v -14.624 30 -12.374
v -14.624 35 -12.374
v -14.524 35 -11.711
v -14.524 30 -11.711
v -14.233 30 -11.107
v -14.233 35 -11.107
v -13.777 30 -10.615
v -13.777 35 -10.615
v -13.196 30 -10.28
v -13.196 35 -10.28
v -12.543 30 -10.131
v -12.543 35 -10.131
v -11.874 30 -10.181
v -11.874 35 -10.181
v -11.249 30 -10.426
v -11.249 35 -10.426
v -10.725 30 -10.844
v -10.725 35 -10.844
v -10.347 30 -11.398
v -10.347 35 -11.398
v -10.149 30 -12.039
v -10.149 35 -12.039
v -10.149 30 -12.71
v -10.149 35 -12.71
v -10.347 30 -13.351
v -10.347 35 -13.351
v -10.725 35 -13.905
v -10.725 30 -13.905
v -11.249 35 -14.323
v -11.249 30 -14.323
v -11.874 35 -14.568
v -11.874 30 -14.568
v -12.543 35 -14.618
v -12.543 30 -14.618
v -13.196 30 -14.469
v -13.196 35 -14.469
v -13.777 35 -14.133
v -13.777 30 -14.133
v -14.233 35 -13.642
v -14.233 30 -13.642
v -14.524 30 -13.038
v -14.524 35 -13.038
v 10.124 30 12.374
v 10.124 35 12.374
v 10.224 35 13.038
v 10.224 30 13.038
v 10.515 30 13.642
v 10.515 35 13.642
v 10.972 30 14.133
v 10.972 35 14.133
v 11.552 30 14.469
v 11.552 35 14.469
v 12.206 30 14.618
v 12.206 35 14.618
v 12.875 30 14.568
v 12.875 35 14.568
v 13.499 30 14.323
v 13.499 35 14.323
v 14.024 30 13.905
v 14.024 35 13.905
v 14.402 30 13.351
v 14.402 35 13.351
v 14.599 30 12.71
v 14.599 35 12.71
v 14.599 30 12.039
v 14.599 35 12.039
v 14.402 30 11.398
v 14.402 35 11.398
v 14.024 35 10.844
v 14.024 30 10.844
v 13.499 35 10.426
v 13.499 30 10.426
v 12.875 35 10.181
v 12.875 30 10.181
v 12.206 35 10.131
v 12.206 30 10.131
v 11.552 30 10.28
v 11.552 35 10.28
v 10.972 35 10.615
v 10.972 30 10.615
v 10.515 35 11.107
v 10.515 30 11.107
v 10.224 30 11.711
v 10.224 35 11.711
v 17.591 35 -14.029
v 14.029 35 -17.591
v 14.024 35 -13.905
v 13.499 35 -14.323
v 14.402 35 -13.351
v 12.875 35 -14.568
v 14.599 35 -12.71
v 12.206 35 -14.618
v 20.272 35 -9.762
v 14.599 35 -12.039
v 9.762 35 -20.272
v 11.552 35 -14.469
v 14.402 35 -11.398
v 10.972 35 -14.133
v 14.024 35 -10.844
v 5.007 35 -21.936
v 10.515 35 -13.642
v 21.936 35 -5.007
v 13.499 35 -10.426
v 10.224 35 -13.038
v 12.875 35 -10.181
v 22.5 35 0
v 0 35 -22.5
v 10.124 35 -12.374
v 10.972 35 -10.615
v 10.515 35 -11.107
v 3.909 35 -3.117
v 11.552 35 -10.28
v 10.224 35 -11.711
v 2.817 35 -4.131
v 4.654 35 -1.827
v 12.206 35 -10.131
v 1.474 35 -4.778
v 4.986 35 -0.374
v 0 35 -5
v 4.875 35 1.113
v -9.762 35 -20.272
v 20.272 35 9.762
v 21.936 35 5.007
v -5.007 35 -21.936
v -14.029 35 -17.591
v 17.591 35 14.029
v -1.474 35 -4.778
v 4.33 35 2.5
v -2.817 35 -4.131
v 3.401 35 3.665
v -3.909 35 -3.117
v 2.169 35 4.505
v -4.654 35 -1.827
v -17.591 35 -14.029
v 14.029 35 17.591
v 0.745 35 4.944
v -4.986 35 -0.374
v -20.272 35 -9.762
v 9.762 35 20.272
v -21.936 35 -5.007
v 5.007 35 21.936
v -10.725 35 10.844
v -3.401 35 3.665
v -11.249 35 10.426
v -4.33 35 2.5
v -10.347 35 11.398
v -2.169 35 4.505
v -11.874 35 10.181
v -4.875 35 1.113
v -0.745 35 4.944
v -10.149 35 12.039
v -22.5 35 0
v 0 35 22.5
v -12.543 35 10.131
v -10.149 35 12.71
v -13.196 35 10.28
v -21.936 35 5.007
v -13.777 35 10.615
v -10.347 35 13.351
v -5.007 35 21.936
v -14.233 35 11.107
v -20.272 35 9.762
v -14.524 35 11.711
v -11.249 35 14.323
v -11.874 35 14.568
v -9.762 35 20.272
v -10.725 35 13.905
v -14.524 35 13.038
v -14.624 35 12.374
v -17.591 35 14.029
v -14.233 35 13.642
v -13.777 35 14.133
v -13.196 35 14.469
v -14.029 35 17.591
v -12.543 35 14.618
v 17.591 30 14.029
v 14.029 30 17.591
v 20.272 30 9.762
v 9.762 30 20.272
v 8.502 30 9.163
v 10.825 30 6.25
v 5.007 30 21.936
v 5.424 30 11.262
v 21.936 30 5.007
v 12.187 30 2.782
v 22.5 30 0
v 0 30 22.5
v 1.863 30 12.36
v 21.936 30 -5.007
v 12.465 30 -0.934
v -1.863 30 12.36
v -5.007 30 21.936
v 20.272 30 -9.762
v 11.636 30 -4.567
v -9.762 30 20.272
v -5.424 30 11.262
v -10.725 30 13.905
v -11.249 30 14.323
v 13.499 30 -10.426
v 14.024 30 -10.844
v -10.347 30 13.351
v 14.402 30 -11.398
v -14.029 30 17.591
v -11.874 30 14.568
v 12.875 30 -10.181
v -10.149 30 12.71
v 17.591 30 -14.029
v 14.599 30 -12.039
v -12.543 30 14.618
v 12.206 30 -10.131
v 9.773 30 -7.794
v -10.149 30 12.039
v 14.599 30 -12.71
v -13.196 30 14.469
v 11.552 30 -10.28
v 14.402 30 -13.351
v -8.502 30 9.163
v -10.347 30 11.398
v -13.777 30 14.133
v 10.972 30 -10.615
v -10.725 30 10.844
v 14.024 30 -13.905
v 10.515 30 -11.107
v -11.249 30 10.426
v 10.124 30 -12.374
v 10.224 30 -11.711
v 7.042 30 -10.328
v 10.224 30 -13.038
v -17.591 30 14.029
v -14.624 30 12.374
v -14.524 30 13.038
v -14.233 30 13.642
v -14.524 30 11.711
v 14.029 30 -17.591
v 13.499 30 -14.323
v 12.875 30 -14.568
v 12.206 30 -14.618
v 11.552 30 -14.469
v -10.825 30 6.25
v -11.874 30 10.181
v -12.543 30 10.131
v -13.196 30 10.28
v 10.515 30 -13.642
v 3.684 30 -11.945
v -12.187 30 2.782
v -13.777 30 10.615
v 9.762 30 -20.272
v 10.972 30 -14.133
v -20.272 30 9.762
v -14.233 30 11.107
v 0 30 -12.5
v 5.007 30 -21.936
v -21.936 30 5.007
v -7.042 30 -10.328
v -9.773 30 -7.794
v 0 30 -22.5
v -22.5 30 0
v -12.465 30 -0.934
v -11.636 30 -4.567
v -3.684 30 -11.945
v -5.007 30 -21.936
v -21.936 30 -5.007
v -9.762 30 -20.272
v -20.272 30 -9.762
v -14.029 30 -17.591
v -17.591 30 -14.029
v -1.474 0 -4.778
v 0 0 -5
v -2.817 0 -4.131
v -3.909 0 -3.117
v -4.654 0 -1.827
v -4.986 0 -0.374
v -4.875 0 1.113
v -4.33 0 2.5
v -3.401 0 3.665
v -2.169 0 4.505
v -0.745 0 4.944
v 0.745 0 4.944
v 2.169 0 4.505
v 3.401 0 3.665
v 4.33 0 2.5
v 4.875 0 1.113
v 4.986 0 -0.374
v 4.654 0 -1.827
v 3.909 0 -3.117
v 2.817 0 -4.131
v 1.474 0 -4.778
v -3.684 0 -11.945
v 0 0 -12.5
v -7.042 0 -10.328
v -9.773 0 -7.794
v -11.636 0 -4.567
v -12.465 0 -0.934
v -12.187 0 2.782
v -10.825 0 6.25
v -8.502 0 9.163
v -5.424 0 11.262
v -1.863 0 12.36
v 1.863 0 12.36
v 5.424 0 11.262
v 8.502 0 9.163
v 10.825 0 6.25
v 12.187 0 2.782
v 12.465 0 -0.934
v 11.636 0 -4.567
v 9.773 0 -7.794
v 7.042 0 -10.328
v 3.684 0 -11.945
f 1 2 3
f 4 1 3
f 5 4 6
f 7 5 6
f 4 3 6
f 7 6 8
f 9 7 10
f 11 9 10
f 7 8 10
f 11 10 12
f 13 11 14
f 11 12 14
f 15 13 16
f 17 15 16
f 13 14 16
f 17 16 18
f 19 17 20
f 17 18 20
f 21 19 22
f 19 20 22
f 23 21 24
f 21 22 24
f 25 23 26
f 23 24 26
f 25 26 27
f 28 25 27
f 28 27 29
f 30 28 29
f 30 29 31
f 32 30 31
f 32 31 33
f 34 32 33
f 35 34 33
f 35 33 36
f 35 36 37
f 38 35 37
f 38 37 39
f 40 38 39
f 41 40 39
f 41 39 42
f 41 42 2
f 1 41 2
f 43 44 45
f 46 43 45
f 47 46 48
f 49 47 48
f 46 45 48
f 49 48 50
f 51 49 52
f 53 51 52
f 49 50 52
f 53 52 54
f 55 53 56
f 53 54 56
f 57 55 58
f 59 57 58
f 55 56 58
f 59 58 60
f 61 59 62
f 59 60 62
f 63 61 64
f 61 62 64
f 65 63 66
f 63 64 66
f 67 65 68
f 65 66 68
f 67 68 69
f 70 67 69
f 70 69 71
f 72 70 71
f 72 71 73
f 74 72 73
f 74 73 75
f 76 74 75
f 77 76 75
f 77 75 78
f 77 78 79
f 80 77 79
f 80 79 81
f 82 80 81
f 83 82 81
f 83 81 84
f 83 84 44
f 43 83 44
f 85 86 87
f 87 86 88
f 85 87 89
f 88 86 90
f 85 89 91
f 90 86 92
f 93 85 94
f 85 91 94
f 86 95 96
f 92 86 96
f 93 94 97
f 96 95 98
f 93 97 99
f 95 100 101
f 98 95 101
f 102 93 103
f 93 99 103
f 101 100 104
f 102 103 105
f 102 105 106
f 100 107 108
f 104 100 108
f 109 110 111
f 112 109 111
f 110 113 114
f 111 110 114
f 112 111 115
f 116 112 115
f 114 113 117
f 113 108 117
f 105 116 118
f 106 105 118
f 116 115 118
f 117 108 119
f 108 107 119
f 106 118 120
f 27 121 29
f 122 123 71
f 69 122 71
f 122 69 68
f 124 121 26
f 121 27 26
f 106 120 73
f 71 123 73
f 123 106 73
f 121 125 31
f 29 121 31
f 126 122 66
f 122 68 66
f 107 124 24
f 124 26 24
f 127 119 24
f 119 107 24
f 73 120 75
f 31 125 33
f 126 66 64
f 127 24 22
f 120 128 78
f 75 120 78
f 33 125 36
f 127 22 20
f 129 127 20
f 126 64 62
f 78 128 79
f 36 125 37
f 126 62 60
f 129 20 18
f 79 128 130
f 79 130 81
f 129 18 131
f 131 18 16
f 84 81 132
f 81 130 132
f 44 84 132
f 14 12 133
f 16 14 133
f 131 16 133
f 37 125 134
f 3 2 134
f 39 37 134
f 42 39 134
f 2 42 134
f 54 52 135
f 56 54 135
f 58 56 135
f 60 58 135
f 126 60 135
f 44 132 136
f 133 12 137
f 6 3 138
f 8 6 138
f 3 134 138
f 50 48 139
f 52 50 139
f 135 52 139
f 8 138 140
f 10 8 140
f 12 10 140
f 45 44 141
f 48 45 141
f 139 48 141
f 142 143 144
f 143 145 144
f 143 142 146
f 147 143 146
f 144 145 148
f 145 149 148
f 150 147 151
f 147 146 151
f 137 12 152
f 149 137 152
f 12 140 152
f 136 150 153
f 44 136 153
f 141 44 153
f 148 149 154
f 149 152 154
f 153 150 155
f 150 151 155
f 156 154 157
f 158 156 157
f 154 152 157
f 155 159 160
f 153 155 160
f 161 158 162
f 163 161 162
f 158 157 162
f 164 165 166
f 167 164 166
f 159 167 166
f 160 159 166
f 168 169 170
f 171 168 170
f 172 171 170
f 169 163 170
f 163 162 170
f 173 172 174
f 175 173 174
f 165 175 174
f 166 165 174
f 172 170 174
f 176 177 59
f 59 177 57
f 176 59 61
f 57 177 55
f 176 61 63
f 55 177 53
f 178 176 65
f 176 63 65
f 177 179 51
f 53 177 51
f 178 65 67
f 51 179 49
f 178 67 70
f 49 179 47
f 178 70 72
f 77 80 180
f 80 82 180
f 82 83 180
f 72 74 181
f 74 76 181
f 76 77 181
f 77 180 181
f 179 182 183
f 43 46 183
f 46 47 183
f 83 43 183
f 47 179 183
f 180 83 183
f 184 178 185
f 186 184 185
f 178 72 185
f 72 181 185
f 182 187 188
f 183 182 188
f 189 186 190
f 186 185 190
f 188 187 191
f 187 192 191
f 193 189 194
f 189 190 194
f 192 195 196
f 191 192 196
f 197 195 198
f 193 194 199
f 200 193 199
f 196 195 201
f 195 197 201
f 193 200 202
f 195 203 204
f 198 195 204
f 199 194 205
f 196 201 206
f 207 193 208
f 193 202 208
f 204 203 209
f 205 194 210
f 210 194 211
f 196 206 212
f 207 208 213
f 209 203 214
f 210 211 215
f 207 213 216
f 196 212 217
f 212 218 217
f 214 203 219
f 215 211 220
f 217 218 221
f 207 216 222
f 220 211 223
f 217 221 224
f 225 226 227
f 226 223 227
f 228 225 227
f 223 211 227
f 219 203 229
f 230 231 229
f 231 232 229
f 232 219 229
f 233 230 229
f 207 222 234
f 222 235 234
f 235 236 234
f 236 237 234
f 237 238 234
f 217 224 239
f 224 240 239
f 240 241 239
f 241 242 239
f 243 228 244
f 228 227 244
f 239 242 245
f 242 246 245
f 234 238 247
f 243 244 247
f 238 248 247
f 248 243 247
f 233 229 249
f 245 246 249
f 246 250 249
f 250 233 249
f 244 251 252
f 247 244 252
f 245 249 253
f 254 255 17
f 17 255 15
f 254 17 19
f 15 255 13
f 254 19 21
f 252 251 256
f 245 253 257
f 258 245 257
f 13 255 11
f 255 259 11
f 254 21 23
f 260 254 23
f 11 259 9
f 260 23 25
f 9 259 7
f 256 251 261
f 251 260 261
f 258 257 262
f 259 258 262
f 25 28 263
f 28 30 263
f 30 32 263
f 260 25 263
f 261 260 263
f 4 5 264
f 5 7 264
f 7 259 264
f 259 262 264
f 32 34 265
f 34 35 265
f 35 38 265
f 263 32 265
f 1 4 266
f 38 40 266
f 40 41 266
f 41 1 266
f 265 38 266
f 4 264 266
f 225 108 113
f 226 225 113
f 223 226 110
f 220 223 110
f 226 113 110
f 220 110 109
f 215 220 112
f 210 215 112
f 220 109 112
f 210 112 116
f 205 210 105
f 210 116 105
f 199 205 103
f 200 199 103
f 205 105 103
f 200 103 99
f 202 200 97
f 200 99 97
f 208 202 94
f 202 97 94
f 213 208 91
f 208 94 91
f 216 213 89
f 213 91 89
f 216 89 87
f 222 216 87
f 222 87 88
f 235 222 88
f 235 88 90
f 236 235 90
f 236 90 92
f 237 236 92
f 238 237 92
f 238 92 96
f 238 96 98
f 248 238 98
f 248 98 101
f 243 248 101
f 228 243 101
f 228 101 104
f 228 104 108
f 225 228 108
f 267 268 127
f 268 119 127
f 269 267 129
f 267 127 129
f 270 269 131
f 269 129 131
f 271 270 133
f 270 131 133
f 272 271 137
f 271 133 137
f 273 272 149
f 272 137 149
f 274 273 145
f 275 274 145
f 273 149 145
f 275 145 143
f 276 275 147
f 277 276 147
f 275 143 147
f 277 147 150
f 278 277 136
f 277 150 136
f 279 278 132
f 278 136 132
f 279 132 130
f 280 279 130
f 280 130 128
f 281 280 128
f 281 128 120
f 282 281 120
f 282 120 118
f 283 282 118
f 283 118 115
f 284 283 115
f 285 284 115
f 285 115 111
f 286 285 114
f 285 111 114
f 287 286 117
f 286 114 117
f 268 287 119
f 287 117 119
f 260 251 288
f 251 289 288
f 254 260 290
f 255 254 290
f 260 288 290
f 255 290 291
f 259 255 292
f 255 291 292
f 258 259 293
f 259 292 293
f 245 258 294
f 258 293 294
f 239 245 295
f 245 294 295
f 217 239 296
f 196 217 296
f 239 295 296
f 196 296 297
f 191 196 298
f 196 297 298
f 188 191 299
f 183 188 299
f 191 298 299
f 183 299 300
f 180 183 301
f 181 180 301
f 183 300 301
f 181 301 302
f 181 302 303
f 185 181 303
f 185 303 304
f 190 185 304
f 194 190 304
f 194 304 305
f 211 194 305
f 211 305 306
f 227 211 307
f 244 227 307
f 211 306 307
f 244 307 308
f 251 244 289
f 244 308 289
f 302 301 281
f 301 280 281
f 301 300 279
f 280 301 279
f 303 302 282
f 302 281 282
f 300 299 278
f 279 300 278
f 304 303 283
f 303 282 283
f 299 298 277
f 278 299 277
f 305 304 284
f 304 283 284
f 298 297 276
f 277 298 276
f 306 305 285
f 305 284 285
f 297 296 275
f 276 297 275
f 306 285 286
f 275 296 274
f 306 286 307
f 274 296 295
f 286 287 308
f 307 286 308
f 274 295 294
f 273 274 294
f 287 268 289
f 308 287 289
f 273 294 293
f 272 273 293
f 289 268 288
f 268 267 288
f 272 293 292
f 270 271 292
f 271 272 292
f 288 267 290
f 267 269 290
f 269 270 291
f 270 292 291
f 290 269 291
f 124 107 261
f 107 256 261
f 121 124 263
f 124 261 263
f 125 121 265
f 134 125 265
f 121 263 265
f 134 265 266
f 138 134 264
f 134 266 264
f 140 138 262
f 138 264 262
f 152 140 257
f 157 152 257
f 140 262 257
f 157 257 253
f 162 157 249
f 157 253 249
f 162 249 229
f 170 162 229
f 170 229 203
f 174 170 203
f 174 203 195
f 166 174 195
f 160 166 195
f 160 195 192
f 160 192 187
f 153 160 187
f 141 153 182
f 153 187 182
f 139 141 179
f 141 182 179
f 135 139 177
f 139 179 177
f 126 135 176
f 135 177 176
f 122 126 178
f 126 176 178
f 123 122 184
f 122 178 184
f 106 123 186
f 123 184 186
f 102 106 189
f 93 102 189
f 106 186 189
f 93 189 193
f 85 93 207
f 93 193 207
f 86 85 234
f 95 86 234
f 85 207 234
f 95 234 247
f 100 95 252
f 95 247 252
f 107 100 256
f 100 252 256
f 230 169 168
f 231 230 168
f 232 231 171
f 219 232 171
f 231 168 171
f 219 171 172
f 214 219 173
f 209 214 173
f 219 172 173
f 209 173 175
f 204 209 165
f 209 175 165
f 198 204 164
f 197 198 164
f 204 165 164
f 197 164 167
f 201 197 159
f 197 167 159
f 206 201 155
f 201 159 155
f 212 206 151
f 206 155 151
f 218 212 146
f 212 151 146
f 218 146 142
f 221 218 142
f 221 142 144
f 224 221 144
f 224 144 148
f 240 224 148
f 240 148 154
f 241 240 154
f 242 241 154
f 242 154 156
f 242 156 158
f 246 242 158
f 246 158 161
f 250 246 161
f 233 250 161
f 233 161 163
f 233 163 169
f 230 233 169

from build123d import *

# Parameters (mm, degrees)
HOLE_WIZARD_M41_D = 4.5


with BuildPart() as part:
    # Эскиз1 → Повернуть1 (revolve)
    with BuildSketch(Plane.XY, mode=Mode.PRIVATE) as revolve_1_sk:
        Polygon((5, 35), (22.5, 35), (22.5, 30), (12.5, 30), (12.5, 0), (5, 0), align=None)
    revolve(revolve_1_sk.sketch.rotate(Axis((0, 0, 0), (0, 1, 0)), 90), axis=Axis((0, 0, 0), (0, 1, 0)))

    # Отверстие с зазором M41 (through all)
    with Locations(Plane.XZ.offset(-30)):
        with Locations((-12.374368671, 12.374368671), (-12.374368671, -12.374368671), (12.374368671, -12.374368671), (12.374368671, 12.374368671)):
            Hole(HOLE_WIZARD_M41_D / 2)


solid = part.part
